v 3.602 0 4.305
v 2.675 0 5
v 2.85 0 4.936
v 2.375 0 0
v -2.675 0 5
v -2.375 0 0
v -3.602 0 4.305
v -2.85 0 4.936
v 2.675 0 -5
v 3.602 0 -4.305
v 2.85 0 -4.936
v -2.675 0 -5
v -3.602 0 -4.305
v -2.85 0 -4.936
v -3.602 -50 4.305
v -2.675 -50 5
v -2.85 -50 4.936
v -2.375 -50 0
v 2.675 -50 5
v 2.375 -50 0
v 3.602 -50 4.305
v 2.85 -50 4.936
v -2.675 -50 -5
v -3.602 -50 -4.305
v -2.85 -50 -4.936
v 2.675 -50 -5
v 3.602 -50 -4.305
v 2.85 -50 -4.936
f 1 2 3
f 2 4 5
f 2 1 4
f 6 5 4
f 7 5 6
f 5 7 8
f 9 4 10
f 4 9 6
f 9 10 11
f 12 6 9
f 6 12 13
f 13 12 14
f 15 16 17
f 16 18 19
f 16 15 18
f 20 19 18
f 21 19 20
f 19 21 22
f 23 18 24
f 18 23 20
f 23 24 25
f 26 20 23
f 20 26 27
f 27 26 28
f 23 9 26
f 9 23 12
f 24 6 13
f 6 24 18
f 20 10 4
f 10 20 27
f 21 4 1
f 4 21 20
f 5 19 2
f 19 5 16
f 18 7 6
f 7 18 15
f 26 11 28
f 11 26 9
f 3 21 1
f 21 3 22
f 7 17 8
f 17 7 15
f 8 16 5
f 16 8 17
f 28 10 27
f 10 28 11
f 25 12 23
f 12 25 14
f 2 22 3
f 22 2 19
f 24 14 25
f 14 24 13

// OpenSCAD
// file: globals.scad
/*
Most things in this file is represented as one millimeter, so keep that in mind while changing things.
Some of the setting are not mm but at variables that you can set, such as 2*x=2x and you are setting what x is.
I will try to specify when things are variables and not exact measurements.
*/

obj_leg = 30;
leg_length = 5.5;
small_number = 0.001;
metal_core_rode_global = 5;


///////////////// number of holes /////////////////////
z_hole_number = 8;
other_holes = 8;

///////////////// Pins /////////////////////

//pins that poke out
ball_size = 10;
pin_height = 20;
pin_diameter = 6;


//holes
hole_ball_size = ball_size;
hole_pin_height = pin_height;
hole_pin_diameter = pin_diameter;

///////////////// Z THINGS /////////////////////

berring_slot_width = 7.5;
berring_slot_depth = 6.5;
metal_core_rode = 5;

///////////////// X THINGS /////////////////////

//male dove tails
max_width=8;
min_width=5;
depth=5;
height=obj_leg/2;

//female dove tails, this is found on the y mounts
girl_max_width=11;
girl_min_width=5;
girl_depth=5;
girl_height=obj_leg;


///////////////// Y THINGS /////////////////////
/*
The Y is so normal that all of those global variables at the top should change all of the setting in it, this section is set her incase there are variables set in the future development of this project.
*/
// file: include.scad
//////////////////      END SECTION       //////////////////

	module added_pins(){
		difference(){
			union(){
				translate([30/(15/4),obj_leg*leg_length,30/(15/4)]) pin();
				translate([30/(15/4)+14.5,obj_leg*leg_length,30/(15/4)+14]) pin();
			}
			union(){
							translate([30/(15/4)+13.5,obj_leg*leg_length-20,30/(15/4)+5])cube(size=[2,40,15]);
							translate([30/(15/4)+7.5,obj_leg*leg_length-20,30/(15/4)+15])rotate([0,90,0]) cube(size=[2,40,15]);	

							translate([30/(15/4)-1,obj_leg*leg_length-20,30/(15/4)-8])cube(size=[2,40,15]);
							translate([30/(15/4)-10,obj_leg*leg_length-20,30/(15/4)+1])rotate([0,90,0]) cube(size=[2,40,15]);
			}
		}
	}
	module taken_pins() {
		translate([30/(15/4)+14,obj_leg*leg_length-10,30/(15/4)]) mirror_pin();
		translate([30/(15/4),obj_leg*leg_length-10,30/(15/4)+15]) mirror_pin();
	}


//////////////////      OTHER STUFF       //////////////////

	module holes() {
		rotate([0,0,90]) for(y=[0:other_holes])
		translate([obj_leg+y*15,-15.5,7.5]) union() {
			translate([7.5,0,15]) hole_up();
			hole_down();
		}
	}
	module extend_holes() {
	module top(){
		rotate([0,0,90]) for(y=[0:other_holes+1])
		translate([(30/4)+y*15,-15.5,7.5]) union() {
			translate([7.5,0,15]) hole_up();
		}
	}
	module bottom(){
		rotate([0,0,90]) for(y=[0:other_holes+2])
		translate([(30/4)+y*15,-15.5,7.5]) union() {
			hole_down();
		
}
	}
	union(){
		top();
		bottom();
	}
	}

	module hole() {
		union() {
			rotate([90, 90, 0]) cylinder(h=40, d=hole_pin_diameter, center=true);
			translate([0,7.5,0]) sphere(d=hole_ball_size);
			translate([0,-6,0]) sphere(d=hole_ball_size);
		}
	}
	module hole_up() {
		union() {
			rotate([90, 90, 0]) cylinder(h=40, d=hole_pin_diameter, center=true);
			translate([0,7.5,10]) cylinder(h=hole_pin_height, d=hole_pin_diameter, center=true);
			translate([0,-6,10]) cylinder(h=hole_pin_height, d=hole_pin_diameter, center=true);
			translate([0,7.5,0]) sphere(d=hole_ball_size);
			translate([0,-6,0]) sphere(d=hole_ball_size);
		}
	}
	module hole_down() {
		union() {
			rotate([90, 90, 0]) cylinder(h=40, d=hole_pin_diameter, center=true);
			translate([0,7.5,-10]) cylinder(h=hole_pin_height, d=hole_pin_diameter, center=true);
			translate([0,-6,-10]) cylinder(h=hole_pin_height, d=hole_pin_diameter, center=true);
			translate([0,7.5,0]) sphere(d=hole_ball_size);
			translate([0,-6,0]) sphere(d=hole_ball_size);
		}
	}
	module pin() {
		union() {
			rotate([90, 90, 0]) cylinder(h=pin_height, d=pin_diameter, center=true);
			translate([0,7.5,0]) sphere(d=ball_size);
		}
	}

	module mirror_pin() {
		rotate([90, 90, 0]) cylinder(h=hole_pin_height+small_number, d=hole_pin_diameter, center=true);
		translate([0,-(pin_height-(ball_size/2)),0]) sphere(d=ball_size);
	}


//////////////////      SOME RACK AND Z THINGS       //////////////////

module z_holes() {
    rotate([0,-90,0]) for(z=[0:z_hole_number])
    translate([22.5+z*15,16,-12])
        hole();
}

module pin_cuts() {
	union(){
		cube(size=[2,10,40], center=true);
		rotate([0,0,90]) cube(size=[2,10,40], center=true);
	}
}
module pin_uncut() {
	union(){
		rotate([0, 0, 90]) cylinder(h=hole_pin_height, d=hole_pin_diameter, center=true);
		translate([0,0,10]) sphere(d=ball_hole);
	}
}


module pin_out() {
	union(){
		rotate([0, 0, 90]) cylinder(h=pin_height, d=pin_diameter, center=true);
		translate([0,0,10]) sphere(d= ball_size);
	}
}


module pins_z(){
	difference() {
		pin_out();
		pin_cuts();
	}
}
//////////////////      RACK AND SLIDE     ///////////////////

module straight_pins() {
	for(z=[0:((((obj_leg*leg_length)*2)-(obj_leg*2))/3)/14.5]) rotate([-90,0,0]) translate([z*15,30/(15/4),14]) pins_z();
	for(z=[0:((((obj_leg*leg_length)*2)-(obj_leg*2))/3)/14.5]) rotate([-90,0,0]) translate([z*15,30/(15/4)-14,14]) pins_z();
}
module stagger_pins() {
	for(z=[0:((((obj_leg*leg_length)*2)-(obj_leg*2))/3)/14.5]) rotate([-90,0,0]) translate([z*15,30/(15/4),14]) pins_z();
	for(z=[0:((((obj_leg*leg_length)*2)-(obj_leg*2))/3)/14.5]) rotate([-90,0,0]) translate([z*15+7,30/(15/4)-14,14]) pins_z();
}


//////////////////      DOVE TAIL       //////////////////

module male_dovetail(height) {
	dovetail_3d(max_width,min_width,depth,height);
}

module dovetail_3d(max_width=11, min_width=5, depth=5, height=30) {
	linear_extrude(height=height, convexity=2)
		dovetail_2d(max_width,min_width,depth);
}

module dovetail_2d(max_width=11, min_width=5, depth=5) {
	angle=atan((max_width/2-min_width/2)/depth);
	echo("angle: ", angle);
	polygon(paths=[[0,1,2,3,0]], points=[[-min_width/2,0], [-max_width/2,depth], [max_width/2, depth], [min_width/2,0]]);
}

//bow tie
	module tie_end(height){
				rotate([0,0,0]) translate([0,-0.01,((obj_leg/2)/2)]) male_dovetail(height);
				rotate([0,90,0]) translate([0,-0.01,((obj_leg/2)/2)]) male_dovetail(height);
				rotate([0,180,0]) translate([0,-0.01,((obj_leg/2)/2)]) male_dovetail(height);
				rotate([0,-90,0]) translate([0,-0.01,((obj_leg/2)/2)]) male_dovetail(height);
	}

module bow_support(){
	difference(){
		intersection(){
			translate([-15,0,-15]) cube([30,9,30]);
			scale([1.05,1.05,1.05]) rotate([0,45,0]) tie_end();
		}
		cube([29.2,29.2,29.2], center=true);
	}
}

	module wrap(units){
	for (y = [-1:units-2]) // two iterations, z = -1, z = 1
	{
			translate([15, (y*30)+15, 15]){
			for (r = [0:4]) // two iterations, z = -1, z = 1
			{
				rotate([0,r*90,0]) translate([0,15,15]) rotate([-90,0,0])male_dovetail(height=30);
			}
		}
	}
	}
// main file
length = 50;
tilt_level = 1.1;
scaling_x = .95;
scaling_y = 1;
scaling_z = 1;
include <include.scad>;
include <globals.scad>;

obj_leg= 12;
module bow_tie_master(){
	union(){
		mirror([0,1,0]){
			male_dovetail(height=length);
		}
			male_dovetail(height=length);		
	}
}

intersection(){
    scale([scaling_x,scaling_y,scaling_z])	rotate([90,0,0]) bow_tie_master();
    rotate([90,0,0]) cylinder(r=5.7, h=200);
}
